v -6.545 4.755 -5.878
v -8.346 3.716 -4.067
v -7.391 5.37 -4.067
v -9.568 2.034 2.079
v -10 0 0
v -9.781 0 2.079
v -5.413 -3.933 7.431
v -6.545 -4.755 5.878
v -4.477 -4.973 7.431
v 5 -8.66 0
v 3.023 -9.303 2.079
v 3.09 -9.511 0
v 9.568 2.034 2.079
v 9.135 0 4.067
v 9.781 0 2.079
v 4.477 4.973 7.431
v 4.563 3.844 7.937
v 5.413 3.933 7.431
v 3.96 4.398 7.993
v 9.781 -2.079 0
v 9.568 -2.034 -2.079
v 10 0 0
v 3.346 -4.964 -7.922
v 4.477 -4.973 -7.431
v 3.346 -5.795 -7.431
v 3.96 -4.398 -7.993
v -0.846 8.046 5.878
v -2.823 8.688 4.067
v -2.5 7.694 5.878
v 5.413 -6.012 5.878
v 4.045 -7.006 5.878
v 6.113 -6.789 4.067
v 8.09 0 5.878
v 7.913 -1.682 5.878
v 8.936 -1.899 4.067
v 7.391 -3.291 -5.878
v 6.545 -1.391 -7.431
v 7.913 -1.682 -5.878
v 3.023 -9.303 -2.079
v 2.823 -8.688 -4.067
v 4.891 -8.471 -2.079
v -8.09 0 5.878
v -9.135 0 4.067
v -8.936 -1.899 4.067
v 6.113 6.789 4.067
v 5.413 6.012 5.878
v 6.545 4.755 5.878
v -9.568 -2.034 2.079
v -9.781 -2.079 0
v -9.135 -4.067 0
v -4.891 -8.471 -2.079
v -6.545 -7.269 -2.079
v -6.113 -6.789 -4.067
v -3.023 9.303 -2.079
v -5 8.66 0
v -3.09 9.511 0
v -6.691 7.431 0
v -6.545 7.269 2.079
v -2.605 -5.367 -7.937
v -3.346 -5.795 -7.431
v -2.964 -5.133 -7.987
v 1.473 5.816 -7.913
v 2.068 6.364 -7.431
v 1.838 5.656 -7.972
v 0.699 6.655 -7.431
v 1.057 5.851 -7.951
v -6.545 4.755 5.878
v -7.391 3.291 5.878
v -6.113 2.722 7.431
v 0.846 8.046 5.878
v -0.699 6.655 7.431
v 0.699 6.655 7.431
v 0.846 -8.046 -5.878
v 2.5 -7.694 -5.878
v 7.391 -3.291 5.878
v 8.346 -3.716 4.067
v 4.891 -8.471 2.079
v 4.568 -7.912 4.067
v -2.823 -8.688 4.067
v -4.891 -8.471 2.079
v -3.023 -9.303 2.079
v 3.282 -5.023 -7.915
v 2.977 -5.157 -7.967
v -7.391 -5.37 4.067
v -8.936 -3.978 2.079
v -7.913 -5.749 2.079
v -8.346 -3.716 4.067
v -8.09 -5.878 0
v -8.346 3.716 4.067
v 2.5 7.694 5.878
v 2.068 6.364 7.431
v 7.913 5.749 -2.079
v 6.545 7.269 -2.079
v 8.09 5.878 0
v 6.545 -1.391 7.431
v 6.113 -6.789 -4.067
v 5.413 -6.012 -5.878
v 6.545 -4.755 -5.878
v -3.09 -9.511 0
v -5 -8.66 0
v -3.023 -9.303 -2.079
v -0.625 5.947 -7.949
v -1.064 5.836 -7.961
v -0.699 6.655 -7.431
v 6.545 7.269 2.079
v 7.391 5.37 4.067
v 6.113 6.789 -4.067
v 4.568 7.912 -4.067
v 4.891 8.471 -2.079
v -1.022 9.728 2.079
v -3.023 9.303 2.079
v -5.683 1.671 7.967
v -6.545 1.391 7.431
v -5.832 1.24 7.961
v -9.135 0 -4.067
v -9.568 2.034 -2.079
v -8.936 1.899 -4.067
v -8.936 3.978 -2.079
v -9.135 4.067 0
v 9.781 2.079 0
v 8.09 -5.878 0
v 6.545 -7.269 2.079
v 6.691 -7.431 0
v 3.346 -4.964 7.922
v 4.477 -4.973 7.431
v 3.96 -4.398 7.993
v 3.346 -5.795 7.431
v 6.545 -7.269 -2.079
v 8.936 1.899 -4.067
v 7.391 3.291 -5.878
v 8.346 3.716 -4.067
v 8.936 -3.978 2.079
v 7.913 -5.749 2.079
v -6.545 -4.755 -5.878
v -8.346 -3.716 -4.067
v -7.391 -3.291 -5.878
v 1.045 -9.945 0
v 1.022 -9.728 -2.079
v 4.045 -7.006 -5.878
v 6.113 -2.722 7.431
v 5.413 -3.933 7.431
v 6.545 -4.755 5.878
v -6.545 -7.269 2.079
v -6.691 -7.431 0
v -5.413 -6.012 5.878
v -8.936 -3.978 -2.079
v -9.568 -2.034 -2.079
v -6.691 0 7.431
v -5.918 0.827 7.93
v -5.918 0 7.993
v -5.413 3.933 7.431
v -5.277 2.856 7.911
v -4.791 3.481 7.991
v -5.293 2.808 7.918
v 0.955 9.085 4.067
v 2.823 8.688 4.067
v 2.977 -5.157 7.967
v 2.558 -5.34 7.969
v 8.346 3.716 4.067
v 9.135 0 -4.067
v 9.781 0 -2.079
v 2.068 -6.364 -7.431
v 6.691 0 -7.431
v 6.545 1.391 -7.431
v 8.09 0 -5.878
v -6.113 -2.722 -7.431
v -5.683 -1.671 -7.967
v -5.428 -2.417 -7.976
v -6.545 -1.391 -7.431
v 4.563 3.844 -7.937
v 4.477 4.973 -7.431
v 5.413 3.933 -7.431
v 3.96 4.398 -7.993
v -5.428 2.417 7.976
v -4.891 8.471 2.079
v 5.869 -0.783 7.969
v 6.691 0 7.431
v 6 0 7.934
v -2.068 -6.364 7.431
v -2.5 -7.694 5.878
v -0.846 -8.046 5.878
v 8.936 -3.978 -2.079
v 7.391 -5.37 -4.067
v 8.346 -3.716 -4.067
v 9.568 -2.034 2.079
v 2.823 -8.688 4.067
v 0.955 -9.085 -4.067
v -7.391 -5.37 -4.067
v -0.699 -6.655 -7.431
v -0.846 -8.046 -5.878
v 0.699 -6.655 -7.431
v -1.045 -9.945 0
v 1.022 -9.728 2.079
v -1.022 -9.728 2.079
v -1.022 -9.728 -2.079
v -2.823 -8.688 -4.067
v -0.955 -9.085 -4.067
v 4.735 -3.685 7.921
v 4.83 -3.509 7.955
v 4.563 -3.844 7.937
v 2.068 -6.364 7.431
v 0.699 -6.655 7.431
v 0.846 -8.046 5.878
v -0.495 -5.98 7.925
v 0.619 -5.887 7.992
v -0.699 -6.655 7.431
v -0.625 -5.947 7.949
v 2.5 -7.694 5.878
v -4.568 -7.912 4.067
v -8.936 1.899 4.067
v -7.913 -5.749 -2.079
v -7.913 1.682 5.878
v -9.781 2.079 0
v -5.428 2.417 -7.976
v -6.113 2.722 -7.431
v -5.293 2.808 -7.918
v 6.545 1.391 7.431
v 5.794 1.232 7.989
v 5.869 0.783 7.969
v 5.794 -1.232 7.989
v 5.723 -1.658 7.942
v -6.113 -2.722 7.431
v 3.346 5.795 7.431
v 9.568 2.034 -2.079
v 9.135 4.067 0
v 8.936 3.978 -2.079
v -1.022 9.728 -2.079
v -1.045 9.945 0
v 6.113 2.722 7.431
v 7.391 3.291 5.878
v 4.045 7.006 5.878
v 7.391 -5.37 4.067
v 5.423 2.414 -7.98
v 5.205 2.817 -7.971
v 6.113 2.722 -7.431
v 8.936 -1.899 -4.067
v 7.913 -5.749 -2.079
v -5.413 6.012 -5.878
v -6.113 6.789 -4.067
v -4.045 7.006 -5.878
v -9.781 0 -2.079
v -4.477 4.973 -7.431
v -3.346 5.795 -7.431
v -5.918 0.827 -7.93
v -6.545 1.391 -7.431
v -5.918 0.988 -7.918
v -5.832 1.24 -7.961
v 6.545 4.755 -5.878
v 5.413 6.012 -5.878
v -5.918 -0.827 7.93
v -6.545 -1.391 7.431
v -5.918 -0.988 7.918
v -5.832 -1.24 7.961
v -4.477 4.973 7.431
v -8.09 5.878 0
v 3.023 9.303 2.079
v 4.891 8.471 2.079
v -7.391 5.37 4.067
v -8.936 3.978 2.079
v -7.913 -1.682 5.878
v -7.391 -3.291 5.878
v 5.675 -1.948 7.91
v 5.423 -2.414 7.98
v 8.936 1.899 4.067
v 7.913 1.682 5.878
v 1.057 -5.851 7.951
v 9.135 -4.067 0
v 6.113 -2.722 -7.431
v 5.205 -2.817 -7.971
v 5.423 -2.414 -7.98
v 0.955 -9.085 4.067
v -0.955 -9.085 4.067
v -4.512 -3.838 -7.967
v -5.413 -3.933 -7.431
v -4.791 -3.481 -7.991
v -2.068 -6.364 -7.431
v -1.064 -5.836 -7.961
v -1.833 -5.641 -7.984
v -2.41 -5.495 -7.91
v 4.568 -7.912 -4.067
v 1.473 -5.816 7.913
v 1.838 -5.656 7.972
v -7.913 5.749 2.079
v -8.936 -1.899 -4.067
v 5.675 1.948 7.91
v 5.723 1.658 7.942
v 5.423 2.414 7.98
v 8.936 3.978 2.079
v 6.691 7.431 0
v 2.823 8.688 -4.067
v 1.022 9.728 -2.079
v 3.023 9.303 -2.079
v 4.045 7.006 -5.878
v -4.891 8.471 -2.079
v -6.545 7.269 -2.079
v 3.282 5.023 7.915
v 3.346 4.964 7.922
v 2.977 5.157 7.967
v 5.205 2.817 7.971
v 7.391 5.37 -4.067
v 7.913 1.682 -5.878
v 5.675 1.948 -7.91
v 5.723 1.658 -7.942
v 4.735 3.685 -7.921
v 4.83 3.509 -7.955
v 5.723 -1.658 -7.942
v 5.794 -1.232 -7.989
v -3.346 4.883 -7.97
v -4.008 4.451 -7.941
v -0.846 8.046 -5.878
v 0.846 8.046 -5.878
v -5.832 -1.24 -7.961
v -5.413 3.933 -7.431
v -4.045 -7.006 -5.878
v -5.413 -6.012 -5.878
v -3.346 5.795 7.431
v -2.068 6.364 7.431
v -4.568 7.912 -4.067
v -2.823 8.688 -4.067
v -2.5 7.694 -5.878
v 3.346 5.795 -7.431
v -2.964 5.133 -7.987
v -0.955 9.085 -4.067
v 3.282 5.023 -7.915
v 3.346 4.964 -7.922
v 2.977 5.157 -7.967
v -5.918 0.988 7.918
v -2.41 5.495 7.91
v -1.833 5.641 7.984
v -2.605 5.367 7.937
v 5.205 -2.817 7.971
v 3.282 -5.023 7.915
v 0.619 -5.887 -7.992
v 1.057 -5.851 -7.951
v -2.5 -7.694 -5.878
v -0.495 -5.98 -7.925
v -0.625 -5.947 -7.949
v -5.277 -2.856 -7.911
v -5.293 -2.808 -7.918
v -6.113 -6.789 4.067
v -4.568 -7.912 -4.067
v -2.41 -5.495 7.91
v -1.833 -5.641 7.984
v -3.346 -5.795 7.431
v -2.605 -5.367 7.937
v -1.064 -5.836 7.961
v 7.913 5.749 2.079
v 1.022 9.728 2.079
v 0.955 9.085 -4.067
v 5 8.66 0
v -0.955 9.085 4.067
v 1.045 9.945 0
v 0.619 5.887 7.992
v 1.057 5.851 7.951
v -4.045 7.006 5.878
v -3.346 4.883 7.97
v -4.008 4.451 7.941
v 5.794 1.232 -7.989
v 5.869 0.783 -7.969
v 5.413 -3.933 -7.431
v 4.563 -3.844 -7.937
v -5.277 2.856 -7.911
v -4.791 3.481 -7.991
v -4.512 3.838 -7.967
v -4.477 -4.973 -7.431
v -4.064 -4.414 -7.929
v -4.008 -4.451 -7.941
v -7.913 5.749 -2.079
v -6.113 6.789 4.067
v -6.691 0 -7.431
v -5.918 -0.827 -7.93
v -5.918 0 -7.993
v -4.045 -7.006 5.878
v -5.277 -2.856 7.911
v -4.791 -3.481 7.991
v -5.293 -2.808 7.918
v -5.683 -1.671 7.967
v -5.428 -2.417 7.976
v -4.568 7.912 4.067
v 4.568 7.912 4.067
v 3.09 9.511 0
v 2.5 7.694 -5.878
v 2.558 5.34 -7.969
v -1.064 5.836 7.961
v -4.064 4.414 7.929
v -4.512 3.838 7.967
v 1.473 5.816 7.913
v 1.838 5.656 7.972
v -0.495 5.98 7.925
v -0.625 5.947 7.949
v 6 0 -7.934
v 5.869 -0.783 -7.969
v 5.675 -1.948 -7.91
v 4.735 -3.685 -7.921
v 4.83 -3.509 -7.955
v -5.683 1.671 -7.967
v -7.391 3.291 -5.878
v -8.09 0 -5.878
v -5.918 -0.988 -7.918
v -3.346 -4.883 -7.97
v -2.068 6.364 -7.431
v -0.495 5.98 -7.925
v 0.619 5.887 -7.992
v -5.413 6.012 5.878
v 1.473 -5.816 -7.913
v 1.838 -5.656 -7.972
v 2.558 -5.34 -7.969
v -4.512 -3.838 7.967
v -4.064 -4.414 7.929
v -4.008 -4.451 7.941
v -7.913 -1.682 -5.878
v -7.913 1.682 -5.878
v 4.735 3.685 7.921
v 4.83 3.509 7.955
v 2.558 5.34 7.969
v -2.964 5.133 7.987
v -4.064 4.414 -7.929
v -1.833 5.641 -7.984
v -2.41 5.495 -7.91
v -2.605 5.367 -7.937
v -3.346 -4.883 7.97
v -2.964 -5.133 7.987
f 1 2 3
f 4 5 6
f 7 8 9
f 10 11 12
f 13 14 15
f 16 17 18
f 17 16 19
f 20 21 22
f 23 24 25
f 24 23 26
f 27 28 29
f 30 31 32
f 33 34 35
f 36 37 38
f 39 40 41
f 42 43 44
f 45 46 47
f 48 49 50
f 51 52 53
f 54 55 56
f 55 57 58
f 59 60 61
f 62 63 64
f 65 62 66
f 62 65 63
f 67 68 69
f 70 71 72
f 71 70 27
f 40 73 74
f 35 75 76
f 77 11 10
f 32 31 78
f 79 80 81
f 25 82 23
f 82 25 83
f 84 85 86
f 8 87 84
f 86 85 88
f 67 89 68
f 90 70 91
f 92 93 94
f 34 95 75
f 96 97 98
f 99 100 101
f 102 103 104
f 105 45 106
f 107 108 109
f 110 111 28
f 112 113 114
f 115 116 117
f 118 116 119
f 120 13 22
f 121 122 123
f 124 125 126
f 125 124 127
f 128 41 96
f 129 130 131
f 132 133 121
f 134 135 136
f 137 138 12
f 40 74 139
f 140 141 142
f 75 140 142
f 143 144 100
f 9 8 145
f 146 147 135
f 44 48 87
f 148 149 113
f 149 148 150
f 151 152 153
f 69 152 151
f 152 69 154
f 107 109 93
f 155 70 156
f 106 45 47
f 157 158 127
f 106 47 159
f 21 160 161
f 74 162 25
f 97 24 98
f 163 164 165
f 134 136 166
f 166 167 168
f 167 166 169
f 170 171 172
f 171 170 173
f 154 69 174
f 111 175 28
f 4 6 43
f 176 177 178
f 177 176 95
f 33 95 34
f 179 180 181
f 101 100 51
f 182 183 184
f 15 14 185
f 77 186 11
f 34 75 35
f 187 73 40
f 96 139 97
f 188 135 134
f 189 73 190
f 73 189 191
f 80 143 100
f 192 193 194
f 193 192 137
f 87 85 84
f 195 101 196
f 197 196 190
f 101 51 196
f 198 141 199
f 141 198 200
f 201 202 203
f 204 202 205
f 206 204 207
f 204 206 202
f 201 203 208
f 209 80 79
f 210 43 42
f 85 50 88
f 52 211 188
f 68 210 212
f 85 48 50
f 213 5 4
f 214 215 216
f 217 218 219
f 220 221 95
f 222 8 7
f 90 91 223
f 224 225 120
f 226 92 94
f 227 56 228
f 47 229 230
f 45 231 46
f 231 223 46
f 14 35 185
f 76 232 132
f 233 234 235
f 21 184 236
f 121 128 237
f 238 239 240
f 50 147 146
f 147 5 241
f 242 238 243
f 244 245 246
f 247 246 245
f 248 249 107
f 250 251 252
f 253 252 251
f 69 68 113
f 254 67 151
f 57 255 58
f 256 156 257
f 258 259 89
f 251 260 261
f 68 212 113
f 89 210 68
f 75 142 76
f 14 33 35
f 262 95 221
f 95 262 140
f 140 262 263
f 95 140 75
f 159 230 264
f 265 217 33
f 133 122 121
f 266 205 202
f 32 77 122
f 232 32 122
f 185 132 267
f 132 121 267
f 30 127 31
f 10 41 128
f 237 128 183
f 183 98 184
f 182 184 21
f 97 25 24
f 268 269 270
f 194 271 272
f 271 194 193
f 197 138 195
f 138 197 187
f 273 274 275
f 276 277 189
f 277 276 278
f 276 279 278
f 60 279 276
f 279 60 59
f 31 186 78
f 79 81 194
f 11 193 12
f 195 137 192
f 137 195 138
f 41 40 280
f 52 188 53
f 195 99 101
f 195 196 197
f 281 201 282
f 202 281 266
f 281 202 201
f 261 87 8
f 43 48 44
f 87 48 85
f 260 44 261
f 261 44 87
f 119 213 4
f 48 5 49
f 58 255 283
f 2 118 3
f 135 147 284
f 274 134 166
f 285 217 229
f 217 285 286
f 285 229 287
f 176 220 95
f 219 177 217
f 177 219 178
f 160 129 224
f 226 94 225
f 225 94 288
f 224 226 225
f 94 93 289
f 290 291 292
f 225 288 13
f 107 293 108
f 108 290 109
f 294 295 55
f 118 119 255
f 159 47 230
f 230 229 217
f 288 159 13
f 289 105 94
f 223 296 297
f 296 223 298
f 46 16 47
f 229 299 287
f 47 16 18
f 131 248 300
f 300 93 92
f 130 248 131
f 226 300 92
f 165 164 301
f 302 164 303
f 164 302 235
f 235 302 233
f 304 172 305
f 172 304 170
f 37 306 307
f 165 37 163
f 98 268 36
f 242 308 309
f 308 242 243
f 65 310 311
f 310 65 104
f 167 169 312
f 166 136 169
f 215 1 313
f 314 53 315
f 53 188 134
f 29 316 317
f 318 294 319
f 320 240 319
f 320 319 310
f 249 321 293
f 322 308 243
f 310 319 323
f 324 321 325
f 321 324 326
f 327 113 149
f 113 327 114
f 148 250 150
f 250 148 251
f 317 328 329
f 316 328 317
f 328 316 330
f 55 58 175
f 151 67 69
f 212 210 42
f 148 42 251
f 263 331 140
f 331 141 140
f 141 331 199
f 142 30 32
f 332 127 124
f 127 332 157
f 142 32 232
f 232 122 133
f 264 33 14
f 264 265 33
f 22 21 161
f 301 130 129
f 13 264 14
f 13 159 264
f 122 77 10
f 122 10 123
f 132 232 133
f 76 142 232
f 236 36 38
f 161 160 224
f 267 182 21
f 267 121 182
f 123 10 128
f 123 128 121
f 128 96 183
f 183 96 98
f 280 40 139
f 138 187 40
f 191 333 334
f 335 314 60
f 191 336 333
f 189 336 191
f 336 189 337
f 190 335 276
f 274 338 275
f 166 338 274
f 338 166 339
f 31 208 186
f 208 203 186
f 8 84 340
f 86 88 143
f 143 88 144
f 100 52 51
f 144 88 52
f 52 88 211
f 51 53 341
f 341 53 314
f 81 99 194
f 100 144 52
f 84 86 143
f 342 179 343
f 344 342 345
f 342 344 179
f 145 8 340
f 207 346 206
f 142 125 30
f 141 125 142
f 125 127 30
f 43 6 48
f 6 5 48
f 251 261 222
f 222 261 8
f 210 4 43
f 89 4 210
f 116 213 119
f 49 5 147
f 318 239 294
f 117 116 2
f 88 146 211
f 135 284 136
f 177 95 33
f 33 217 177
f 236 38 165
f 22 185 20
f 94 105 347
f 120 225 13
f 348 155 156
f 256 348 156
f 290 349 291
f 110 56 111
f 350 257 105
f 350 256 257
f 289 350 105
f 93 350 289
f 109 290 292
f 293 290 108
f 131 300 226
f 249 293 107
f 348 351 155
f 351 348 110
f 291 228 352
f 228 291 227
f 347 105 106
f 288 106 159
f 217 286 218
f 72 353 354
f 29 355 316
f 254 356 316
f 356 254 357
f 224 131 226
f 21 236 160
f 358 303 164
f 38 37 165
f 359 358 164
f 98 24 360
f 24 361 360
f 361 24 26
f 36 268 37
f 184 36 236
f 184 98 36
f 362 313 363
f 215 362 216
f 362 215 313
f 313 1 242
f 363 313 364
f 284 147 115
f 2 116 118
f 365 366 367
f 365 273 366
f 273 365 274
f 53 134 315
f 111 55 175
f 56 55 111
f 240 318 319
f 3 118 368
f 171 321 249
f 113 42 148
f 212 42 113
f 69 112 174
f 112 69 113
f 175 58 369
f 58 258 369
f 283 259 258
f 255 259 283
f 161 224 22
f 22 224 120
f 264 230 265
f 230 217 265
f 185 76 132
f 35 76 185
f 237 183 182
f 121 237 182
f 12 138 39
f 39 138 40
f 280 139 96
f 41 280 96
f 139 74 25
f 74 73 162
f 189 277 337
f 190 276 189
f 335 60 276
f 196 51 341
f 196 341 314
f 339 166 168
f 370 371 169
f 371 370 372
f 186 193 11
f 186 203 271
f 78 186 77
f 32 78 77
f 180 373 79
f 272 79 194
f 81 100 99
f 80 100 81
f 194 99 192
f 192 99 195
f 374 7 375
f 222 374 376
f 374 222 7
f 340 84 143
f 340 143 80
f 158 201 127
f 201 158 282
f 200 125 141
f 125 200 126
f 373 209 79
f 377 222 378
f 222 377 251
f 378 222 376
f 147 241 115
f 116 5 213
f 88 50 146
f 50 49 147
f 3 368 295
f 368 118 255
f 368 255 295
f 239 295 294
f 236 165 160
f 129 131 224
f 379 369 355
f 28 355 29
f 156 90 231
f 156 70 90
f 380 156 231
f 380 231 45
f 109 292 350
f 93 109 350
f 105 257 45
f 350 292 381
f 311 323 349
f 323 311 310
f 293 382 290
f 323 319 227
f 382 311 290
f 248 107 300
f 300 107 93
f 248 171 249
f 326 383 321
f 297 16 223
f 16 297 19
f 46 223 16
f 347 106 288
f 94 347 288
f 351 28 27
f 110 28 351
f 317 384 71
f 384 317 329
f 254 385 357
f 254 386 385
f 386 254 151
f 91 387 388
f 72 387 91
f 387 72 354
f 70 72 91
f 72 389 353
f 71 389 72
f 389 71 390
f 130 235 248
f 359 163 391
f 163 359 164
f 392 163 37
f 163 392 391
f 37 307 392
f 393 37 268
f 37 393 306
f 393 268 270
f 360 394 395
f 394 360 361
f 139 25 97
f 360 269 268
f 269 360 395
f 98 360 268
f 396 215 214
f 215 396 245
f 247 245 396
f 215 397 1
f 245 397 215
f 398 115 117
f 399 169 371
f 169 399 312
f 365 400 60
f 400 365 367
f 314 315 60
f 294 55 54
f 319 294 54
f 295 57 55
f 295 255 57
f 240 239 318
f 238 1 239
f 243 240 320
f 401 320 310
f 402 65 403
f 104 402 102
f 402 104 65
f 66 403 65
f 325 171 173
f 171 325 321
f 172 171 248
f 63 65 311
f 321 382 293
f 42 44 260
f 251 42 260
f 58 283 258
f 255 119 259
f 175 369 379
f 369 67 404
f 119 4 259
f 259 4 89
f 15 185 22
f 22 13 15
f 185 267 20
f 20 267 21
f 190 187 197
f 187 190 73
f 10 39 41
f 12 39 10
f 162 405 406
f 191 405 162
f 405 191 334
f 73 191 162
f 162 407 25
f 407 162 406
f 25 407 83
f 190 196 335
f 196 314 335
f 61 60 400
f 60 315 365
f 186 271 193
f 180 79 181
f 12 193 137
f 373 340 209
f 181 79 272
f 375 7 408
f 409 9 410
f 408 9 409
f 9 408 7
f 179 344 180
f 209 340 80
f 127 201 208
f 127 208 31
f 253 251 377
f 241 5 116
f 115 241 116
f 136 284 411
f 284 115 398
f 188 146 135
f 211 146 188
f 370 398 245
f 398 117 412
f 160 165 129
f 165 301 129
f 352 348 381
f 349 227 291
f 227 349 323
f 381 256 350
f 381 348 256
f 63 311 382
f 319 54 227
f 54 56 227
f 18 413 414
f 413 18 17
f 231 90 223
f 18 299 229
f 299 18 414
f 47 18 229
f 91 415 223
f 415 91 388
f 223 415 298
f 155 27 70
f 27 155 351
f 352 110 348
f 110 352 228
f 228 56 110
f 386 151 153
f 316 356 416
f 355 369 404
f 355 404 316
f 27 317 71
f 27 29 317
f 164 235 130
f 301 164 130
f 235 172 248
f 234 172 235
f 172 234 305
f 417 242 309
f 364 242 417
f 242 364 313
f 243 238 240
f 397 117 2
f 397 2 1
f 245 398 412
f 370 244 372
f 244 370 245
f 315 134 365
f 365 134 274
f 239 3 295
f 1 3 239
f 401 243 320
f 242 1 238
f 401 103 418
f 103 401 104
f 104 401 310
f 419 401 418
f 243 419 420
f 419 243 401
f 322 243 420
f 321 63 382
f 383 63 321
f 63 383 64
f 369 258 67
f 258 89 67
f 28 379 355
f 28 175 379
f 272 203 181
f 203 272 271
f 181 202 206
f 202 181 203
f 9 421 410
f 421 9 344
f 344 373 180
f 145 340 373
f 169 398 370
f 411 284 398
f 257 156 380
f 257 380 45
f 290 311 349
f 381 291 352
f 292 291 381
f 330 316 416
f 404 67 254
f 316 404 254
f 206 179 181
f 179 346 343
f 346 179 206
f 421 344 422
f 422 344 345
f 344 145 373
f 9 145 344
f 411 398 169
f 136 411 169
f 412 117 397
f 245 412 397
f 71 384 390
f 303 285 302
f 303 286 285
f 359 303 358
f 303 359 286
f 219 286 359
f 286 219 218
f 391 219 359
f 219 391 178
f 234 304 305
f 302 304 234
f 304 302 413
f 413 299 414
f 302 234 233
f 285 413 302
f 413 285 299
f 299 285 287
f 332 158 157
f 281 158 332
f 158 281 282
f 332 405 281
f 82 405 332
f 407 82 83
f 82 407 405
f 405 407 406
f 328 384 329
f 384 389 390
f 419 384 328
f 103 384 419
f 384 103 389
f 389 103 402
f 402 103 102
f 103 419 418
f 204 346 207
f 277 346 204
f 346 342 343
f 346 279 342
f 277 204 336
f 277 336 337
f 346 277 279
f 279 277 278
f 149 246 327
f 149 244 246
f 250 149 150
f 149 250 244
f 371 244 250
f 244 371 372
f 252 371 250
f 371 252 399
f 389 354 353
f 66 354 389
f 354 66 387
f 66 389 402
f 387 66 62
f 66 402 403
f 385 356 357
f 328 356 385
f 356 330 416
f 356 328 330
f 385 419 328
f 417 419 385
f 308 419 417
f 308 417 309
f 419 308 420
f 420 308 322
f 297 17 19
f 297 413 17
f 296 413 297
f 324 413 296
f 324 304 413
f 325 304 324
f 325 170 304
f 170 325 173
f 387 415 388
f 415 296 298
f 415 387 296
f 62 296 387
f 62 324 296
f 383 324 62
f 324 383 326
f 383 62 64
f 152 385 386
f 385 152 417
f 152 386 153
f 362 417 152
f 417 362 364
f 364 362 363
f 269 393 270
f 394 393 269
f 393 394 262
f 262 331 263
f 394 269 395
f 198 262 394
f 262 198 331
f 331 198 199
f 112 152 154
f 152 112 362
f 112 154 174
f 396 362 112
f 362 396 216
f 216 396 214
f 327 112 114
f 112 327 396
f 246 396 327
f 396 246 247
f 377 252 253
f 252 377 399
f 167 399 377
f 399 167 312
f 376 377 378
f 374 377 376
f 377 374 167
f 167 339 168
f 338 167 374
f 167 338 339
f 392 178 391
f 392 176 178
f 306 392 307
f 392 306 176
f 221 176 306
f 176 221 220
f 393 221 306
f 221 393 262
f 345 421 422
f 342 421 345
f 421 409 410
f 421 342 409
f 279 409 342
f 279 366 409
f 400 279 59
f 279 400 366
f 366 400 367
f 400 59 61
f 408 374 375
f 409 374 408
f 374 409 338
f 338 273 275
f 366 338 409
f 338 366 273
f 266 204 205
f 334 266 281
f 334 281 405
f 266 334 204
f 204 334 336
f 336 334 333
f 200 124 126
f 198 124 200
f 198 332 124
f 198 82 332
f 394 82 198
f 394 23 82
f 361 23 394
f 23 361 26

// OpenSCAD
difference() {
  sphere(r=10);
  #cylinder(h=30, r=6, center=true);
}
